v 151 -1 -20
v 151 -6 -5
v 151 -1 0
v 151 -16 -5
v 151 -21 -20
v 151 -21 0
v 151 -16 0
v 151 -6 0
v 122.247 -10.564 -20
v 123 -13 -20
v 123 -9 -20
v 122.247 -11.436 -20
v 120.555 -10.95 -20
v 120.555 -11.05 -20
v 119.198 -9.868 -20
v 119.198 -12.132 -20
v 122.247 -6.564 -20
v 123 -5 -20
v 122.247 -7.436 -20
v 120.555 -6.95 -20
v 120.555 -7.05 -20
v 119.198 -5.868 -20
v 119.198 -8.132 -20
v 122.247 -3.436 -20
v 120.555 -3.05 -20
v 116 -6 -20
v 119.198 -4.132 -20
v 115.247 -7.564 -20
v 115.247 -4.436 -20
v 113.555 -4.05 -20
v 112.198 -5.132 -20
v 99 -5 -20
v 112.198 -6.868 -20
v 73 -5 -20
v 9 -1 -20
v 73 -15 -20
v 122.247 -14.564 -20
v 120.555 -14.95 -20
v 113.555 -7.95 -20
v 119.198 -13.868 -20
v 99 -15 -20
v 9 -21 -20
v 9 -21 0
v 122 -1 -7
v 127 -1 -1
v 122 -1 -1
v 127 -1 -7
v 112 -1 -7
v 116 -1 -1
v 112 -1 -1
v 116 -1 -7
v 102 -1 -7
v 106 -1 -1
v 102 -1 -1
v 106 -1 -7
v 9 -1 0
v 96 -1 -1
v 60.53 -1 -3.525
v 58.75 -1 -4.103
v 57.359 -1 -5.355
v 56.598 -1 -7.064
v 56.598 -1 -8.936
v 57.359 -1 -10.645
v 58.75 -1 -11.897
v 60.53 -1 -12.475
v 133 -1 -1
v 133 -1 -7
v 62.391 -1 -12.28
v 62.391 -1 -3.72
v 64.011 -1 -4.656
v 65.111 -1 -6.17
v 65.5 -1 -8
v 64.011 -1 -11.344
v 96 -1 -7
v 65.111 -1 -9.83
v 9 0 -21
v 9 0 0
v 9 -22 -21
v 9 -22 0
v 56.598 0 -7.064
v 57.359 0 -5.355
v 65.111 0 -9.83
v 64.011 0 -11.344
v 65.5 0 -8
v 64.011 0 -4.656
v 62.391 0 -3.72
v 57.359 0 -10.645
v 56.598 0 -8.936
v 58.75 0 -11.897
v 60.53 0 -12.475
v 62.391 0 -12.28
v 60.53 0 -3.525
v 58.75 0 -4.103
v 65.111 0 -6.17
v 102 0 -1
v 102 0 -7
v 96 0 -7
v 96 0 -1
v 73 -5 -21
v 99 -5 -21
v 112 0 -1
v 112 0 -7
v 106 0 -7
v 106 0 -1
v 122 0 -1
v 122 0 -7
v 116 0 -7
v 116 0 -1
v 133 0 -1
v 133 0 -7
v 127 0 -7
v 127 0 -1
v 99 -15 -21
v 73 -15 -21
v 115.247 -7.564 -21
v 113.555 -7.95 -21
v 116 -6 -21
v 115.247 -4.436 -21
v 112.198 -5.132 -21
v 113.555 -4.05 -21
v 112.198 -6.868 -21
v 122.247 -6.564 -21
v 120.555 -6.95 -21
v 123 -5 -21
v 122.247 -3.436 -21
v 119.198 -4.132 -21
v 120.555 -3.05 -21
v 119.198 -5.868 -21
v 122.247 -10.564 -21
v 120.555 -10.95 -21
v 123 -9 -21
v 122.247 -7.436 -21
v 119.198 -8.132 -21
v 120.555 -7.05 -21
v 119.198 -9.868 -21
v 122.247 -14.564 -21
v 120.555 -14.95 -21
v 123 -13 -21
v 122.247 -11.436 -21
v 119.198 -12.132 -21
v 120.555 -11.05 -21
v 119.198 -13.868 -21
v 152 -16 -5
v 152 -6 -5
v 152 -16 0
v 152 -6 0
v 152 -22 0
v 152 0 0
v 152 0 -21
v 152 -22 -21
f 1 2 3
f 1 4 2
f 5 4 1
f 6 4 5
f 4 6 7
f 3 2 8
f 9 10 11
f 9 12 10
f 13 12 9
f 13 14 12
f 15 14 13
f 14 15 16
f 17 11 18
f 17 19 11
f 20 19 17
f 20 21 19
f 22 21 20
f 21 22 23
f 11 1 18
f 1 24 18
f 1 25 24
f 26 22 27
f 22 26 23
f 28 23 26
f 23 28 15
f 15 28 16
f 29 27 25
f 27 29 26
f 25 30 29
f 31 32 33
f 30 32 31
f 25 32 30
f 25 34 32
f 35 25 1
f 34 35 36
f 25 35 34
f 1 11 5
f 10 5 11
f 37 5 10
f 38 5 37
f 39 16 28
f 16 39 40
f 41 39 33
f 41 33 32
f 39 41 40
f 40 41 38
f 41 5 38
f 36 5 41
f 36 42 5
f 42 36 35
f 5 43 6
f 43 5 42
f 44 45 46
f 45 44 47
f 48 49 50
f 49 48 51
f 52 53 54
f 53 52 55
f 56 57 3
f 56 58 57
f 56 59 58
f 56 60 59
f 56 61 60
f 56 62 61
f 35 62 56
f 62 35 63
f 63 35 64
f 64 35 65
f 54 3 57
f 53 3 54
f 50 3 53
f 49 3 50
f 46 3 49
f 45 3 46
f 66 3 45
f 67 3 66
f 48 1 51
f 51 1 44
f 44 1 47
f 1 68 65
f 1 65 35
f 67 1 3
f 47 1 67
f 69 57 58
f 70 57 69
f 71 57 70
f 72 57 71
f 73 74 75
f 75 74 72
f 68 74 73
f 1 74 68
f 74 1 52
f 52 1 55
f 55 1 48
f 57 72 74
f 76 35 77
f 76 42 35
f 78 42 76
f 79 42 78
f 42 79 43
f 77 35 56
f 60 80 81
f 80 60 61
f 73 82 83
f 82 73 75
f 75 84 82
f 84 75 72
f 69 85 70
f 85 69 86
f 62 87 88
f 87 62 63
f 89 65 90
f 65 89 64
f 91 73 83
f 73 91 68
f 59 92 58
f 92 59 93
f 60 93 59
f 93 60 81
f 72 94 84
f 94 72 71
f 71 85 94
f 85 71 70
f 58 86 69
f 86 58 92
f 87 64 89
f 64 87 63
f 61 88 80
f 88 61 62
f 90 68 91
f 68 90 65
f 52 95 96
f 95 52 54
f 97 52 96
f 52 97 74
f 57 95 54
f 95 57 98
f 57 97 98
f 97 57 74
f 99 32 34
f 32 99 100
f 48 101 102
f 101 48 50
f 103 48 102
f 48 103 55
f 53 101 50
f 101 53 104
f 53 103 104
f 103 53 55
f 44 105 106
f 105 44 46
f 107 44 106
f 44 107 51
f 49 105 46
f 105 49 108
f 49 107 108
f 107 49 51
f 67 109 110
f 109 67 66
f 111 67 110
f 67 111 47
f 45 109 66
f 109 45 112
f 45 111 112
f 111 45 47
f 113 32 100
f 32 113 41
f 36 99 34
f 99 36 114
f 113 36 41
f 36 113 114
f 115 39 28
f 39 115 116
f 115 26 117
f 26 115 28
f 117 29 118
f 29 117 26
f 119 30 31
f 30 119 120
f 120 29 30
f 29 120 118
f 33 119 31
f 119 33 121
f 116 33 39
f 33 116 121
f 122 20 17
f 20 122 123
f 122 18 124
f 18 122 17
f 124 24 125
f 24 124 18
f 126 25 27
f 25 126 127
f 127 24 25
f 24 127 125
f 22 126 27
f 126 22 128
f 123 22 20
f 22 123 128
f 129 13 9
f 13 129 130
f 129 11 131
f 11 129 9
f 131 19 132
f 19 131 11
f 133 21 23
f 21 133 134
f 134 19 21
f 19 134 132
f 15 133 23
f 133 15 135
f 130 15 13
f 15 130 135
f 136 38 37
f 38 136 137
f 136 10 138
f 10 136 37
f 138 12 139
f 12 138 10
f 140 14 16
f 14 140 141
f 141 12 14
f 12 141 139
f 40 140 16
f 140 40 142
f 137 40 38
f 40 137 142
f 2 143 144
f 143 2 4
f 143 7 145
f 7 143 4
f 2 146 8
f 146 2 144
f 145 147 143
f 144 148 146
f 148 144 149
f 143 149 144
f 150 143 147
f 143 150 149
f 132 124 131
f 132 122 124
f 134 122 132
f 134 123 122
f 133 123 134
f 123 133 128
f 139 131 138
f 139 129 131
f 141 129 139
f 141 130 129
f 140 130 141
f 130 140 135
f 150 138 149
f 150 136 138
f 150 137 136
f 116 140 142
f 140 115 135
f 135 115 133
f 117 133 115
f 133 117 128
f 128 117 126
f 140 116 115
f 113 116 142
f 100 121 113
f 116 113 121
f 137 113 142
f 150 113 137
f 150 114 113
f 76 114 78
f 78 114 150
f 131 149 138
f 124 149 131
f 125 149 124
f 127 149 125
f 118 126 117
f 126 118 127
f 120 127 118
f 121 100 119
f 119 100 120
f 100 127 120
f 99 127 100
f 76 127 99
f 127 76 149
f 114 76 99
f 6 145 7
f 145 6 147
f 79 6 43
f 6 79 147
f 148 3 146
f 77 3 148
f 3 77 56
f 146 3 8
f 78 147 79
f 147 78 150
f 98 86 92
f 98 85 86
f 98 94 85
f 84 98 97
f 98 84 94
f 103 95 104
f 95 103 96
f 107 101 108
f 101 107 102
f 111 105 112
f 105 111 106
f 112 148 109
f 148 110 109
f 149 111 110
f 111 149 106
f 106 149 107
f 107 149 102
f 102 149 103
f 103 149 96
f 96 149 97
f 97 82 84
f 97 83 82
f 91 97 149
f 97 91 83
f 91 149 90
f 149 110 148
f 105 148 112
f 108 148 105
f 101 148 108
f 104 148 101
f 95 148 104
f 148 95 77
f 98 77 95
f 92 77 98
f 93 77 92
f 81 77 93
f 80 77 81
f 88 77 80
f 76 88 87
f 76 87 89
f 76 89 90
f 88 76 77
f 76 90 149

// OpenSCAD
//!
//! @file
//! @brief Casing for pinprobe prototype
//!
//! @version 2.0
//! @author Arco van Geest <arco@appeltaart.mine.nu>
//! @copyright 2021 Arco van Geest <arco@appeltaart.mine.nu> All right reserved.
//! @license  Creative Commons - Attribution - Share alike https://creativecommons.org/licenses/by-sa/4.0/

//! @date 20210607 Initial version


wall=1;
rotate([180,0,0]) difference() {
    cube([150+2*wall,20+2*wall,20+wall]);
    union() {
        translate([wall,wall,-1])  cube([150,20,20+1]);
        translate([-1,-1,10])  cube([10,30,20]);
        translate([-1,-1,-1])  cube([10,30,6+1+10]);
        translate([60+wall,8,8]) rotate([90,0,0]) cylinder(d=9,h=20);

        translate([98+wall,8,4]) rotate([90,0,0]) cylinder(d=4,h=20);
        translate([98+wall-3,-1,4-3]) cube([6,6,6]);
        translate([98+10+wall,8,4]) rotate([90,0,0]) cylinder(d=4,h=20);
        translate([98+10+wall-3,-1,4-3]) cube([6,6,6]);
        translate([98+20+wall,8,4]) rotate([90,0,0]) cylinder(d=4,h=20);
        translate([98+20+wall-3,-1,4-3]) cube([6,6,6]);
        translate([98+31+wall,8,4]) rotate([90,0,0]) cylinder(d=4,h=20);
        translate([98+31+wall-3,-1,4-3]) cube([6,6,6]);

        translate([72+wall,4+wall,0]) cube([26,10,100]);

        translate([98+15+wall,6,4])  cylinder(d=4,h=20);
        translate([98+22+wall,5,4])  cylinder(d=4,h=20);
        translate([98+22+wall,9,4])  cylinder(d=4,h=20);
        translate([98+22+wall,13,4])  cylinder(d=4,h=20);

        translate([150,10+wall-5,-1]) cube([10,10,6]);

        
    } //union
} // difference

//translate([0,30,0]) cube([150+2*wall,20+2*wall,wall]);
